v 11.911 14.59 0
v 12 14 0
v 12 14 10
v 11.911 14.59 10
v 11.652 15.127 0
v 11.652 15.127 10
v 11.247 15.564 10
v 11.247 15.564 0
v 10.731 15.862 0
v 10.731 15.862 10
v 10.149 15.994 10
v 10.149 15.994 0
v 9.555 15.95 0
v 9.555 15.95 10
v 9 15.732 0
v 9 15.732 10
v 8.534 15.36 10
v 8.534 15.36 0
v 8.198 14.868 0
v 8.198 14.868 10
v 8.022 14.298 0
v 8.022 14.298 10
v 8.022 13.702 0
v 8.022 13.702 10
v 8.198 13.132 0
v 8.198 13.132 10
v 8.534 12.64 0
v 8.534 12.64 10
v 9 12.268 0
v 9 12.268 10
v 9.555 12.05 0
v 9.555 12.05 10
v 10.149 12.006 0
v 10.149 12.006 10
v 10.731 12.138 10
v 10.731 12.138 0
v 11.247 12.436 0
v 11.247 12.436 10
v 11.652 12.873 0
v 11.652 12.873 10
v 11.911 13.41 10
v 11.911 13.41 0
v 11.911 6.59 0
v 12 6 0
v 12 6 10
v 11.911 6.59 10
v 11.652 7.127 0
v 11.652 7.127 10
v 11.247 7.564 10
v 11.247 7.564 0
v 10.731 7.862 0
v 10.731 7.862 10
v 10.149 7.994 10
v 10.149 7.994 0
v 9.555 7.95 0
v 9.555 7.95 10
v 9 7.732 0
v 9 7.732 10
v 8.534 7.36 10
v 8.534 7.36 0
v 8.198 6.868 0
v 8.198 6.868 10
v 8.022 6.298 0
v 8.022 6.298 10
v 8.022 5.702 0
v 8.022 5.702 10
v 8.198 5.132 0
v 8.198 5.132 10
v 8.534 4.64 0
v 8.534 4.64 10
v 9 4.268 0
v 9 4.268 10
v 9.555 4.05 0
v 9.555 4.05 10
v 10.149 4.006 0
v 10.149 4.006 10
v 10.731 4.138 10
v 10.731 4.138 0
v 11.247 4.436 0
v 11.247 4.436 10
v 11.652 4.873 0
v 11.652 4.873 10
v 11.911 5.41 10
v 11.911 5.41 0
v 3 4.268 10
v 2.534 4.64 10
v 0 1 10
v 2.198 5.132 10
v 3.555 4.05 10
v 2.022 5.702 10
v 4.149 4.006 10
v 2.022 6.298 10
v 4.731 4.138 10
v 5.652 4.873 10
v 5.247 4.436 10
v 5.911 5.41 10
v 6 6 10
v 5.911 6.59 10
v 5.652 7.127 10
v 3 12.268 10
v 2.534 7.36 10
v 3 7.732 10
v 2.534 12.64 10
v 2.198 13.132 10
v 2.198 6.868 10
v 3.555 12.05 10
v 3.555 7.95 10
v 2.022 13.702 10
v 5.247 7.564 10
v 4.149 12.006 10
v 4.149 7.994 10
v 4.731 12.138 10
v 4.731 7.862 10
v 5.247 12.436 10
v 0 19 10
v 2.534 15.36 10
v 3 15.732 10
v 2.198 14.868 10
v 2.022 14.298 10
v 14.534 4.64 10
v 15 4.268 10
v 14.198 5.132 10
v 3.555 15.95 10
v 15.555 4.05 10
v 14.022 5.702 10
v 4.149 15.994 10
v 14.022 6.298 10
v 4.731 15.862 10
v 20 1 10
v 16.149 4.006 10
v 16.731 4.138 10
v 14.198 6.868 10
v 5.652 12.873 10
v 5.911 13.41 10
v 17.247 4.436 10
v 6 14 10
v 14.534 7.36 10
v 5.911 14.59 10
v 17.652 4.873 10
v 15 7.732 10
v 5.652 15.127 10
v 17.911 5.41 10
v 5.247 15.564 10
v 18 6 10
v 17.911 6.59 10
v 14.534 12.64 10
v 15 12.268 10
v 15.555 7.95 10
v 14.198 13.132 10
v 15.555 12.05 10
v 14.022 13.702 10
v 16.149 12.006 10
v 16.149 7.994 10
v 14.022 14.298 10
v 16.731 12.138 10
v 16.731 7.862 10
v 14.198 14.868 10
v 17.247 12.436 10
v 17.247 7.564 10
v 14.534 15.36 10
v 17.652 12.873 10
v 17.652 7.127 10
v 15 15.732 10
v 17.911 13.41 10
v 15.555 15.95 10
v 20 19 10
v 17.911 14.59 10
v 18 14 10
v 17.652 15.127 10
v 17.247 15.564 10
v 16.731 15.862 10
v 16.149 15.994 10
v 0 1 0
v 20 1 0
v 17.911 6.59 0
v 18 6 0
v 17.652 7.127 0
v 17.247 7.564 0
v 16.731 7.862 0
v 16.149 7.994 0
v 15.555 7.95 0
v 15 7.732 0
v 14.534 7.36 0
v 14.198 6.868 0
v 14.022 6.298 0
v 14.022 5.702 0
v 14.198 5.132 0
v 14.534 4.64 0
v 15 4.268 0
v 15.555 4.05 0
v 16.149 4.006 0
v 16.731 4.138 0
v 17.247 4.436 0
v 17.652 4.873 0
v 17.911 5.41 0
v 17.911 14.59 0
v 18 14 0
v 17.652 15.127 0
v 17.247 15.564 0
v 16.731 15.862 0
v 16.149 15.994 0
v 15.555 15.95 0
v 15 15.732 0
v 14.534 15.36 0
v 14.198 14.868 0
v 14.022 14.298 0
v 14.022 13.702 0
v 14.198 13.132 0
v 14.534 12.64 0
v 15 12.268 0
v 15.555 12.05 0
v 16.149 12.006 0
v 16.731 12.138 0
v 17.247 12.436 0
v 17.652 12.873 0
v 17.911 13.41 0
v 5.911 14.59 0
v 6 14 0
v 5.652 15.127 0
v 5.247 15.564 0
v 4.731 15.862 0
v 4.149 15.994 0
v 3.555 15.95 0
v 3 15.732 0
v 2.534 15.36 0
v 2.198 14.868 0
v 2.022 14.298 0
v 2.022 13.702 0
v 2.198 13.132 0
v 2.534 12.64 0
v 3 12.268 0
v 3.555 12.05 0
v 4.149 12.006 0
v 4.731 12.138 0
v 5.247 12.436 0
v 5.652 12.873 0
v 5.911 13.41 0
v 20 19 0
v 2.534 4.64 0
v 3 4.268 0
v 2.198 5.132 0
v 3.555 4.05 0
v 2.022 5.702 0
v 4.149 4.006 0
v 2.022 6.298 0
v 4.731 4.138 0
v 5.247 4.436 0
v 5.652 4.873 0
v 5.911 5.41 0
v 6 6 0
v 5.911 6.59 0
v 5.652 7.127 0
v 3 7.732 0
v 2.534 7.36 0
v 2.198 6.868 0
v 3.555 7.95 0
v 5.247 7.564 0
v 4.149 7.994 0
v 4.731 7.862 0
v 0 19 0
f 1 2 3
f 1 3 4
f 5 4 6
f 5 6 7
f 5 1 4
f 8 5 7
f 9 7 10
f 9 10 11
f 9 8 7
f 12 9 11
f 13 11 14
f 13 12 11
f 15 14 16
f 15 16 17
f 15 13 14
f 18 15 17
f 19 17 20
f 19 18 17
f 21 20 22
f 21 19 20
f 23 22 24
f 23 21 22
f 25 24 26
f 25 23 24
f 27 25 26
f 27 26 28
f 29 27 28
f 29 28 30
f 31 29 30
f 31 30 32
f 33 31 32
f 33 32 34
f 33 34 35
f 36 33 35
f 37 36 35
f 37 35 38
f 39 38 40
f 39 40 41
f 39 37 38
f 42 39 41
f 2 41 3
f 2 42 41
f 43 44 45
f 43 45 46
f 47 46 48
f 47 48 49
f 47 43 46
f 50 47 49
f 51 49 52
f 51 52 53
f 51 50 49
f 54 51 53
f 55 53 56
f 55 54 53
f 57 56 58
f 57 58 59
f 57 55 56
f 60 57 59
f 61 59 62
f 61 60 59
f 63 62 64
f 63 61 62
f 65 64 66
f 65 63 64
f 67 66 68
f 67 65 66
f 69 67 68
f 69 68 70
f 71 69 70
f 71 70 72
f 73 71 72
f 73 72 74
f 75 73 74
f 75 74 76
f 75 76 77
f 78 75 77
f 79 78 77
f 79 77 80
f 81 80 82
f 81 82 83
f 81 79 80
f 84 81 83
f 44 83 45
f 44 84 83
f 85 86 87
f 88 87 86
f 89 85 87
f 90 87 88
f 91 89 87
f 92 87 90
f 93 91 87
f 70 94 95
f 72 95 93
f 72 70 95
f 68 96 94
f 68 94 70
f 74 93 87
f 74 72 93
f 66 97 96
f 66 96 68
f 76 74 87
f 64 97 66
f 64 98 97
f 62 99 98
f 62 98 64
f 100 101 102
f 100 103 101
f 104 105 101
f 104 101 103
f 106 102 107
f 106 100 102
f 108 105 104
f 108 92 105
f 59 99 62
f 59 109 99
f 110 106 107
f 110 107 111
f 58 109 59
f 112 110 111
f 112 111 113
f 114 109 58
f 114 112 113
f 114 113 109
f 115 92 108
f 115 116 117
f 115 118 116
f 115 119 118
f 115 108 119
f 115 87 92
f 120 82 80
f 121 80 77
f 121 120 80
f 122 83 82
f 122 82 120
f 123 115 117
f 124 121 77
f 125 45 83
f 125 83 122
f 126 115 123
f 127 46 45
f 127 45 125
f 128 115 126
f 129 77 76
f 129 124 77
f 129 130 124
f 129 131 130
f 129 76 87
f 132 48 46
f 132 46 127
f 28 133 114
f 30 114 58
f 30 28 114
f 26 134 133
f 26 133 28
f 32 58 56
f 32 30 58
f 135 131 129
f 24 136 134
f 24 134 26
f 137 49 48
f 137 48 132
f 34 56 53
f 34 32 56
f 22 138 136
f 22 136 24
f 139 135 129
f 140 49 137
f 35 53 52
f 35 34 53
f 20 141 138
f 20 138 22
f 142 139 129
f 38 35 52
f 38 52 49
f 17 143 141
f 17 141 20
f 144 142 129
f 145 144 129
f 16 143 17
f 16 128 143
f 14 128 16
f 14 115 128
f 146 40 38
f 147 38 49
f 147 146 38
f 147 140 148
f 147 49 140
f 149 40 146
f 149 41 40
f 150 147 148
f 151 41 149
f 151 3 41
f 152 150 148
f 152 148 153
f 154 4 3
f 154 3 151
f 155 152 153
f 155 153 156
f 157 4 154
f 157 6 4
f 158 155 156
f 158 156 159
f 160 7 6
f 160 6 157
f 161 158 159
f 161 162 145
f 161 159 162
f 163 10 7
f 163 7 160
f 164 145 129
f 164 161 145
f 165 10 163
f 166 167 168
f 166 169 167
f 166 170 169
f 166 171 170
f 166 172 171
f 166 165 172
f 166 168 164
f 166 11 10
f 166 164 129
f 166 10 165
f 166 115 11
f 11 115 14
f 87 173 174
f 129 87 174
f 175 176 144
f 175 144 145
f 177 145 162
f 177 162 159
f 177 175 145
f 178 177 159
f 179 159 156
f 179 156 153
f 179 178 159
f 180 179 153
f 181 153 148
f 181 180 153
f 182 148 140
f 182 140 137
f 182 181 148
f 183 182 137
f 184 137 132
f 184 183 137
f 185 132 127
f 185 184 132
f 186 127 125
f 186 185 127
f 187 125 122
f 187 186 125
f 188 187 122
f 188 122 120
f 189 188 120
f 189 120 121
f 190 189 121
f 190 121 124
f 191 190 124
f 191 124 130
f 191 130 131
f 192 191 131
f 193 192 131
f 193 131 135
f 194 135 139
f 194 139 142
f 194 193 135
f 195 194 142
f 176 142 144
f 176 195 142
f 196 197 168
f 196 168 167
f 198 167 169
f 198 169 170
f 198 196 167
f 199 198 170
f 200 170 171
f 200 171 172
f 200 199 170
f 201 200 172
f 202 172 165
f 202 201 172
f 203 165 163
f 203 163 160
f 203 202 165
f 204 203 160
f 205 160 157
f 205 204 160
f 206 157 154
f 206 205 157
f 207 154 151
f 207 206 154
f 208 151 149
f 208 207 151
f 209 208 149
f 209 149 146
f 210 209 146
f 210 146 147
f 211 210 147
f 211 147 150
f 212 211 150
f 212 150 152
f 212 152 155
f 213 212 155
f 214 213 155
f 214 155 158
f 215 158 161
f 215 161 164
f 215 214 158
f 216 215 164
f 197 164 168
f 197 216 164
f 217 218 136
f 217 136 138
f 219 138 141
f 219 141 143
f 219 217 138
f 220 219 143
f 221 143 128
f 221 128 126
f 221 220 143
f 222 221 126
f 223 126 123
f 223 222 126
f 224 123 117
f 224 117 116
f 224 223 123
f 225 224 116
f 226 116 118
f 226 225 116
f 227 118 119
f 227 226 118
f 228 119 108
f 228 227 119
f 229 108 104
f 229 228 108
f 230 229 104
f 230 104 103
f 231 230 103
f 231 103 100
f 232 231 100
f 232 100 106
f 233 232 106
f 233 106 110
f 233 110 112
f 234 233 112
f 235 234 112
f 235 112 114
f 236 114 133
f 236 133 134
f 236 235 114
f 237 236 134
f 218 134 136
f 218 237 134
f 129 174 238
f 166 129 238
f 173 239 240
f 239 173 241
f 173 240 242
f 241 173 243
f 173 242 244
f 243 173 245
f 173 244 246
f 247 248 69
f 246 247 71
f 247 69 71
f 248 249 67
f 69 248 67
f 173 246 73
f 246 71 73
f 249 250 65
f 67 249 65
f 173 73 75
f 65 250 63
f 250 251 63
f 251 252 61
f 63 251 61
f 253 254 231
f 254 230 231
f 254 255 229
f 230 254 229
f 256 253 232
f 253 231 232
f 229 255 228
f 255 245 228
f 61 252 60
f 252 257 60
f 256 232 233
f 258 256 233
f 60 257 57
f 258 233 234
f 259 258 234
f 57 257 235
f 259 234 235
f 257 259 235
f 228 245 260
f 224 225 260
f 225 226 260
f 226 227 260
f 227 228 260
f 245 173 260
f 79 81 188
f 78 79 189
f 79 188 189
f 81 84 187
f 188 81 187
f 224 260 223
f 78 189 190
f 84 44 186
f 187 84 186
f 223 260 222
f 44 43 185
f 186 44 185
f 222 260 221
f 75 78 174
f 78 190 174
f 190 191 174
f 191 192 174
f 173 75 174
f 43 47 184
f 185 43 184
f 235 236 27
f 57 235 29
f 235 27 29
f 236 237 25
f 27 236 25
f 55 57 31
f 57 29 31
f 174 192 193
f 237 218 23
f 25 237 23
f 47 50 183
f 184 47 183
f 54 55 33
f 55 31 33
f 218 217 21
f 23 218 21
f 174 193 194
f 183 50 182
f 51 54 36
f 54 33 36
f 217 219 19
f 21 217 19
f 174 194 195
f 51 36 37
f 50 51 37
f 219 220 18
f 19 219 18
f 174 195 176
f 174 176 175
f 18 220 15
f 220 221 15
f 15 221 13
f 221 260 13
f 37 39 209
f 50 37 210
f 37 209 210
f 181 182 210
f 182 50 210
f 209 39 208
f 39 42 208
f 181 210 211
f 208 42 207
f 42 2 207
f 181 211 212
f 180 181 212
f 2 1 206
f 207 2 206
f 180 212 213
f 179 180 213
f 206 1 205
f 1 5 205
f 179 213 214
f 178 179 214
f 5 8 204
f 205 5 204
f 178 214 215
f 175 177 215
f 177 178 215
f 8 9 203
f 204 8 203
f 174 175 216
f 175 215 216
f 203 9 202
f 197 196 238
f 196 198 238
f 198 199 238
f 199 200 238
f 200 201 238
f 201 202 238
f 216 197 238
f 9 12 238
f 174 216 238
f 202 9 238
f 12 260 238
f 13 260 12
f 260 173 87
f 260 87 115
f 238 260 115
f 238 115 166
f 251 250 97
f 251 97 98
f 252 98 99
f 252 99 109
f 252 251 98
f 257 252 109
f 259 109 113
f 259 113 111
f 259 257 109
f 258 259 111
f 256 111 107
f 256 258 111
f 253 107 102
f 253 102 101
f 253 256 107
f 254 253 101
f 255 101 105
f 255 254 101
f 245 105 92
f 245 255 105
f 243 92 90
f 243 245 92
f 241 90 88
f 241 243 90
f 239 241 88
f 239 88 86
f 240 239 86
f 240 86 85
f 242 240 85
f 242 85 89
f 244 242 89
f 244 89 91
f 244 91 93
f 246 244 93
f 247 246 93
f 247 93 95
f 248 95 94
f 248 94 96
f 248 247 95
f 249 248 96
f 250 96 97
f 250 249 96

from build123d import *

# Parameters (mm, degrees)
CYLINDER001_R     = 2
CYLINDER001_DEPTH = 10
CYLINDER002_R     = 2
CYLINDER002_DEPTH = 10
CYLINDER_R        = 2
CYLINDER_DEPTH    = 10
BOX_W             = 20
BOX_H             = 10
BOX_DEPTH         = 10
CYLINDER004_R     = 2
CYLINDER004_DEPTH = 10
CYLINDER005_R     = 2
CYLINDER005_DEPTH = 10
CYLINDER003_R     = 2
CYLINDER003_DEPTH = 10
BOX001_W          = 20
BOX001_H          = 10
BOX001_DEPTH      = 10


with BuildPart() as cylinder001:
    # Cylinder001 → Cylinder001 (new body)
    with BuildSketch(Plane(origin=(10, 5, 0), x_dir=(1, 0, 0), z_dir=(0, 0, 1))):
        Circle(CYLINDER001_R)
    extrude(amount=CYLINDER001_DEPTH)


with BuildPart() as cylinder002:
    # Cylinder002 → Cylinder002 (new body)
    with BuildSketch(Plane(origin=(16, 5, 0), x_dir=(1, 0, 0), z_dir=(0, 0, 1))):
        Circle(CYLINDER002_R)
    extrude(amount=CYLINDER002_DEPTH)


with BuildPart() as cylinder:
    # Cylinder → Cylinder (new body)
    with BuildSketch(Plane(origin=(4, 5, 0), x_dir=(1, 0, 0), z_dir=(0, 0, 1))):
        Circle(CYLINDER_R)
    extrude(amount=CYLINDER_DEPTH)


with BuildPart() as cut002:
    # Box → Box (new body)
    with BuildSketch(Plane.XY):
        with Locations((10, 5)):
            Rectangle(BOX_W, BOX_H)
    extrude(amount=BOX_DEPTH)

    # Cut: cut Cylinder
    add(cylinder.part, mode=Mode.SUBTRACT)

    # Cut001: cut Cylinder002
    add(cylinder002.part, mode=Mode.SUBTRACT)

    # Cut002: cut Cylinder001
    add(cylinder001.part, mode=Mode.SUBTRACT)


with BuildPart() as cut002_1:
    # Cut002 placement: moved
    add(cut002.part.moved(Location((0, 9, 0))))


with BuildPart() as cylinder004:
    # Cylinder004 → Cylinder004 (new body)
    with BuildSketch(Plane(origin=(10, 5, 0), x_dir=(1, 0, 0), z_dir=(0, 0, 1))):
        Circle(CYLINDER004_R)
    extrude(amount=CYLINDER004_DEPTH)


with BuildPart() as cylinder005:
    # Cylinder005 → Cylinder005 (new body)
    with BuildSketch(Plane(origin=(16, 5, 0), x_dir=(1, 0, 0), z_dir=(0, 0, 1))):
        Circle(CYLINDER005_R)
    extrude(amount=CYLINDER005_DEPTH)


with BuildPart() as cylinder003:
    # Cylinder003 → Cylinder003 (new body)
    with BuildSketch(Plane(origin=(4, 5, 0), x_dir=(1, 0, 0), z_dir=(0, 0, 1))):
        Circle(CYLINDER003_R)
    extrude(amount=CYLINDER003_DEPTH)


with BuildPart() as fusion:
    # Box001 → Box001 (new body)
    with BuildSketch(Plane.XY):
        with Locations((10, 5)):
            Rectangle(BOX001_W, BOX001_H)
    extrude(amount=BOX001_DEPTH)

    # Cut003: cut Cylinder003
    add(cylinder003.part, mode=Mode.SUBTRACT)

    # Cut004: cut Cylinder005
    add(cylinder005.part, mode=Mode.SUBTRACT)

    # Cut005: cut Cylinder004
    add(cylinder004.part, mode=Mode.SUBTRACT)


with BuildPart() as fusion_1:
    # Cut005 placement: moved
    add(fusion.part.moved(Location((0, 1, 0))))

    # Fusion: union Cut002
    add(cut002_1.part)


solid = fusion_1.part
